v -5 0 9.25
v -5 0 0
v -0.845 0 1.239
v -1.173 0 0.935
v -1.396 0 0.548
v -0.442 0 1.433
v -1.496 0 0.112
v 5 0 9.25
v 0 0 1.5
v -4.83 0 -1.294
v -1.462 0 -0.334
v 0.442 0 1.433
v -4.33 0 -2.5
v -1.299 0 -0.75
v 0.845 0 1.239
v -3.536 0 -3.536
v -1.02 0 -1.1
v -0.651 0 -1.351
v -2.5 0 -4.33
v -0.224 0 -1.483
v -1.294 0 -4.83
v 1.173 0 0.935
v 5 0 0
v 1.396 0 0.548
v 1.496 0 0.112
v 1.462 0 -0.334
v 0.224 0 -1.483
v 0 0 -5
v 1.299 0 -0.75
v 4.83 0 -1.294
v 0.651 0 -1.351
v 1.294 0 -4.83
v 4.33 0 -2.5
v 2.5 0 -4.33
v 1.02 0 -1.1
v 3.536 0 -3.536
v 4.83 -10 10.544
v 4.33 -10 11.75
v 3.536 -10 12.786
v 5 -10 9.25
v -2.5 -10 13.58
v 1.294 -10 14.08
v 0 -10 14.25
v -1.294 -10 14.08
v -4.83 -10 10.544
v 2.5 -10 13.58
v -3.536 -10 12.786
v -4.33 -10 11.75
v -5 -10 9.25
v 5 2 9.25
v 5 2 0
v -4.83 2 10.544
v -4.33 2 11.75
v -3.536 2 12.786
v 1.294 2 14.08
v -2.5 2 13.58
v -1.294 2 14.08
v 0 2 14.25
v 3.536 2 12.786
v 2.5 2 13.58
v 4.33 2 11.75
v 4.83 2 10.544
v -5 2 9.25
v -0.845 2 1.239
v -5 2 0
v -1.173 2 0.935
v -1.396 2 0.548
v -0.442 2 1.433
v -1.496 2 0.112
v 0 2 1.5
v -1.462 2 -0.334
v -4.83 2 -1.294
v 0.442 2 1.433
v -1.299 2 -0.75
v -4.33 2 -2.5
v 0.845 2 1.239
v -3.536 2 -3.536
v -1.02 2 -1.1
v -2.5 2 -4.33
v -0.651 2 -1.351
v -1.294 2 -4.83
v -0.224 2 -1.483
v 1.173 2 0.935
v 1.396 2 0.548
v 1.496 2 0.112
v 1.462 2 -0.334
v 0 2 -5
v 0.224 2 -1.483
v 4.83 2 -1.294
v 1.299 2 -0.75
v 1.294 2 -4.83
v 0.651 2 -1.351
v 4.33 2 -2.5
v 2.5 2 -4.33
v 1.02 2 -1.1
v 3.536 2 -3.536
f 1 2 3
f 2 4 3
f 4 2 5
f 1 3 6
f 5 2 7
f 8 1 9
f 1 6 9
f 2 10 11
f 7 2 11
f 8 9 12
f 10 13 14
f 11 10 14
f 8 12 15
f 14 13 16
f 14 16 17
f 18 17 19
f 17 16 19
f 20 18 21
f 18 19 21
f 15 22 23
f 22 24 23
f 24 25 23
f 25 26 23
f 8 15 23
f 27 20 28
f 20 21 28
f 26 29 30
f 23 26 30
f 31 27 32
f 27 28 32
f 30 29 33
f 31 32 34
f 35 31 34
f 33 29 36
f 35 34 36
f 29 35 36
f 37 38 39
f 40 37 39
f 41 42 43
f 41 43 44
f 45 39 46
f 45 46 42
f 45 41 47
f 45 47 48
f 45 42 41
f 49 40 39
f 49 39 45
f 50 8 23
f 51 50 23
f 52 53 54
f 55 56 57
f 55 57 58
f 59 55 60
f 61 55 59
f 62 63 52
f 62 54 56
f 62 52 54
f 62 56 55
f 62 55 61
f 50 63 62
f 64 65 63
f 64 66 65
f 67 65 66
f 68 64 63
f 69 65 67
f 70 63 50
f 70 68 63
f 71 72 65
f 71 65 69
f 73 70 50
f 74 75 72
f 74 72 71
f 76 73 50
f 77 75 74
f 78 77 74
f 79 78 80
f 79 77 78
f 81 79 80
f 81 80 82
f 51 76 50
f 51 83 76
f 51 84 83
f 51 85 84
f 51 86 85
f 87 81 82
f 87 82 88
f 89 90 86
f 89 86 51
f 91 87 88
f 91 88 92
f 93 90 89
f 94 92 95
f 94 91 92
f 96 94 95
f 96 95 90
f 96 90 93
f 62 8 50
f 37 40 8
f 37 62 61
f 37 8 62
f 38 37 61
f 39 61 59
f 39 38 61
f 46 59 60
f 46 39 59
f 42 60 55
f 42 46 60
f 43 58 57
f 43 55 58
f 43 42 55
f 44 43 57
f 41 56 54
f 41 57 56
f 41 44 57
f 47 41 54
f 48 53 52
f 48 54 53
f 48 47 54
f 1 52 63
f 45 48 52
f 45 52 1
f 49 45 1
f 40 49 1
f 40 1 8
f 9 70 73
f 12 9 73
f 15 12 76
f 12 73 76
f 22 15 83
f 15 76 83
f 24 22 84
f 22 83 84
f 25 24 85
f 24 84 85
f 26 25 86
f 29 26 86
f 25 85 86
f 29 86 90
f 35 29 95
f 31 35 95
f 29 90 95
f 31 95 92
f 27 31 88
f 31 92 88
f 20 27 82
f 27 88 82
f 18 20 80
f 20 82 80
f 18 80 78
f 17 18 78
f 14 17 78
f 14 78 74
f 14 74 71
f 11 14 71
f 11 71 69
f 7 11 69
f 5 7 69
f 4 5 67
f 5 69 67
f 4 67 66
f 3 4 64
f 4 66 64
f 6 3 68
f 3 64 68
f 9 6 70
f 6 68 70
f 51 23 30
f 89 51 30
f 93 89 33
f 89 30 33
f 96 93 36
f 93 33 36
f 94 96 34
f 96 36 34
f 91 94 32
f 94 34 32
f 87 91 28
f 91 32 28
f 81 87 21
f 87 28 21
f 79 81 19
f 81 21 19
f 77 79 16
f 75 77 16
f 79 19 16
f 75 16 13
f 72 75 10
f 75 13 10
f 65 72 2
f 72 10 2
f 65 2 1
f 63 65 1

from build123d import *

# Parameters (mm, degrees)
EXTRUDE_1_DEPTH     = 2
SKETCH_2_R          = 1.5
CUT_EXTRUDE_1_DEPTH = 2
EXTRUDE_START       = -12
EXTRUDE_2_DEPTH     = 12


with BuildPart() as part:
    # 草图1 → 凸台-拉伸1 (new body)
    with BuildSketch(Plane(origin=(0, 0, 0), x_dir=(1, 0, 0), z_dir=(0, 1, 0))):
        with BuildLine():
            Line((-5, 0), (-5, -9.25))
            ThreePointArc((-5, -9.25), (0, -14.25), (5, -9.25))
            Line((5, -9.25), (5, 0))
            ThreePointArc((5, 0), (0, 5), (-5, 0))
        make_face()
    extrude(amount=EXTRUDE_1_DEPTH)

    # 草图2 → 切除-拉伸1 (cut)
    with BuildSketch(Plane(origin=(0, 2, 0), x_dir=(1, 0, 0), z_dir=(0, 1, 0))):
        with Locations(Location((0, 0, 0), (0, 0, 270))):
            Circle(SKETCH_2_R)
    extrude(amount=-CUT_EXTRUDE_1_DEPTH, mode=Mode.SUBTRACT)

    # 草图3 → 凸台-拉伸2 (add)
    with BuildSketch(Plane(origin=(0, 2, 0), x_dir=(1, 0, 0), z_dir=(0, 1, 0)).offset(EXTRUDE_START)):
        with BuildLine():
            Line((-5, -9.25), (5, -9.25))
            ThreePointArc((5, -9.25), (0, -14.25), (-5, -9.25))
        make_face()
    extrude(amount=EXTRUDE_2_DEPTH)


solid = part.part
